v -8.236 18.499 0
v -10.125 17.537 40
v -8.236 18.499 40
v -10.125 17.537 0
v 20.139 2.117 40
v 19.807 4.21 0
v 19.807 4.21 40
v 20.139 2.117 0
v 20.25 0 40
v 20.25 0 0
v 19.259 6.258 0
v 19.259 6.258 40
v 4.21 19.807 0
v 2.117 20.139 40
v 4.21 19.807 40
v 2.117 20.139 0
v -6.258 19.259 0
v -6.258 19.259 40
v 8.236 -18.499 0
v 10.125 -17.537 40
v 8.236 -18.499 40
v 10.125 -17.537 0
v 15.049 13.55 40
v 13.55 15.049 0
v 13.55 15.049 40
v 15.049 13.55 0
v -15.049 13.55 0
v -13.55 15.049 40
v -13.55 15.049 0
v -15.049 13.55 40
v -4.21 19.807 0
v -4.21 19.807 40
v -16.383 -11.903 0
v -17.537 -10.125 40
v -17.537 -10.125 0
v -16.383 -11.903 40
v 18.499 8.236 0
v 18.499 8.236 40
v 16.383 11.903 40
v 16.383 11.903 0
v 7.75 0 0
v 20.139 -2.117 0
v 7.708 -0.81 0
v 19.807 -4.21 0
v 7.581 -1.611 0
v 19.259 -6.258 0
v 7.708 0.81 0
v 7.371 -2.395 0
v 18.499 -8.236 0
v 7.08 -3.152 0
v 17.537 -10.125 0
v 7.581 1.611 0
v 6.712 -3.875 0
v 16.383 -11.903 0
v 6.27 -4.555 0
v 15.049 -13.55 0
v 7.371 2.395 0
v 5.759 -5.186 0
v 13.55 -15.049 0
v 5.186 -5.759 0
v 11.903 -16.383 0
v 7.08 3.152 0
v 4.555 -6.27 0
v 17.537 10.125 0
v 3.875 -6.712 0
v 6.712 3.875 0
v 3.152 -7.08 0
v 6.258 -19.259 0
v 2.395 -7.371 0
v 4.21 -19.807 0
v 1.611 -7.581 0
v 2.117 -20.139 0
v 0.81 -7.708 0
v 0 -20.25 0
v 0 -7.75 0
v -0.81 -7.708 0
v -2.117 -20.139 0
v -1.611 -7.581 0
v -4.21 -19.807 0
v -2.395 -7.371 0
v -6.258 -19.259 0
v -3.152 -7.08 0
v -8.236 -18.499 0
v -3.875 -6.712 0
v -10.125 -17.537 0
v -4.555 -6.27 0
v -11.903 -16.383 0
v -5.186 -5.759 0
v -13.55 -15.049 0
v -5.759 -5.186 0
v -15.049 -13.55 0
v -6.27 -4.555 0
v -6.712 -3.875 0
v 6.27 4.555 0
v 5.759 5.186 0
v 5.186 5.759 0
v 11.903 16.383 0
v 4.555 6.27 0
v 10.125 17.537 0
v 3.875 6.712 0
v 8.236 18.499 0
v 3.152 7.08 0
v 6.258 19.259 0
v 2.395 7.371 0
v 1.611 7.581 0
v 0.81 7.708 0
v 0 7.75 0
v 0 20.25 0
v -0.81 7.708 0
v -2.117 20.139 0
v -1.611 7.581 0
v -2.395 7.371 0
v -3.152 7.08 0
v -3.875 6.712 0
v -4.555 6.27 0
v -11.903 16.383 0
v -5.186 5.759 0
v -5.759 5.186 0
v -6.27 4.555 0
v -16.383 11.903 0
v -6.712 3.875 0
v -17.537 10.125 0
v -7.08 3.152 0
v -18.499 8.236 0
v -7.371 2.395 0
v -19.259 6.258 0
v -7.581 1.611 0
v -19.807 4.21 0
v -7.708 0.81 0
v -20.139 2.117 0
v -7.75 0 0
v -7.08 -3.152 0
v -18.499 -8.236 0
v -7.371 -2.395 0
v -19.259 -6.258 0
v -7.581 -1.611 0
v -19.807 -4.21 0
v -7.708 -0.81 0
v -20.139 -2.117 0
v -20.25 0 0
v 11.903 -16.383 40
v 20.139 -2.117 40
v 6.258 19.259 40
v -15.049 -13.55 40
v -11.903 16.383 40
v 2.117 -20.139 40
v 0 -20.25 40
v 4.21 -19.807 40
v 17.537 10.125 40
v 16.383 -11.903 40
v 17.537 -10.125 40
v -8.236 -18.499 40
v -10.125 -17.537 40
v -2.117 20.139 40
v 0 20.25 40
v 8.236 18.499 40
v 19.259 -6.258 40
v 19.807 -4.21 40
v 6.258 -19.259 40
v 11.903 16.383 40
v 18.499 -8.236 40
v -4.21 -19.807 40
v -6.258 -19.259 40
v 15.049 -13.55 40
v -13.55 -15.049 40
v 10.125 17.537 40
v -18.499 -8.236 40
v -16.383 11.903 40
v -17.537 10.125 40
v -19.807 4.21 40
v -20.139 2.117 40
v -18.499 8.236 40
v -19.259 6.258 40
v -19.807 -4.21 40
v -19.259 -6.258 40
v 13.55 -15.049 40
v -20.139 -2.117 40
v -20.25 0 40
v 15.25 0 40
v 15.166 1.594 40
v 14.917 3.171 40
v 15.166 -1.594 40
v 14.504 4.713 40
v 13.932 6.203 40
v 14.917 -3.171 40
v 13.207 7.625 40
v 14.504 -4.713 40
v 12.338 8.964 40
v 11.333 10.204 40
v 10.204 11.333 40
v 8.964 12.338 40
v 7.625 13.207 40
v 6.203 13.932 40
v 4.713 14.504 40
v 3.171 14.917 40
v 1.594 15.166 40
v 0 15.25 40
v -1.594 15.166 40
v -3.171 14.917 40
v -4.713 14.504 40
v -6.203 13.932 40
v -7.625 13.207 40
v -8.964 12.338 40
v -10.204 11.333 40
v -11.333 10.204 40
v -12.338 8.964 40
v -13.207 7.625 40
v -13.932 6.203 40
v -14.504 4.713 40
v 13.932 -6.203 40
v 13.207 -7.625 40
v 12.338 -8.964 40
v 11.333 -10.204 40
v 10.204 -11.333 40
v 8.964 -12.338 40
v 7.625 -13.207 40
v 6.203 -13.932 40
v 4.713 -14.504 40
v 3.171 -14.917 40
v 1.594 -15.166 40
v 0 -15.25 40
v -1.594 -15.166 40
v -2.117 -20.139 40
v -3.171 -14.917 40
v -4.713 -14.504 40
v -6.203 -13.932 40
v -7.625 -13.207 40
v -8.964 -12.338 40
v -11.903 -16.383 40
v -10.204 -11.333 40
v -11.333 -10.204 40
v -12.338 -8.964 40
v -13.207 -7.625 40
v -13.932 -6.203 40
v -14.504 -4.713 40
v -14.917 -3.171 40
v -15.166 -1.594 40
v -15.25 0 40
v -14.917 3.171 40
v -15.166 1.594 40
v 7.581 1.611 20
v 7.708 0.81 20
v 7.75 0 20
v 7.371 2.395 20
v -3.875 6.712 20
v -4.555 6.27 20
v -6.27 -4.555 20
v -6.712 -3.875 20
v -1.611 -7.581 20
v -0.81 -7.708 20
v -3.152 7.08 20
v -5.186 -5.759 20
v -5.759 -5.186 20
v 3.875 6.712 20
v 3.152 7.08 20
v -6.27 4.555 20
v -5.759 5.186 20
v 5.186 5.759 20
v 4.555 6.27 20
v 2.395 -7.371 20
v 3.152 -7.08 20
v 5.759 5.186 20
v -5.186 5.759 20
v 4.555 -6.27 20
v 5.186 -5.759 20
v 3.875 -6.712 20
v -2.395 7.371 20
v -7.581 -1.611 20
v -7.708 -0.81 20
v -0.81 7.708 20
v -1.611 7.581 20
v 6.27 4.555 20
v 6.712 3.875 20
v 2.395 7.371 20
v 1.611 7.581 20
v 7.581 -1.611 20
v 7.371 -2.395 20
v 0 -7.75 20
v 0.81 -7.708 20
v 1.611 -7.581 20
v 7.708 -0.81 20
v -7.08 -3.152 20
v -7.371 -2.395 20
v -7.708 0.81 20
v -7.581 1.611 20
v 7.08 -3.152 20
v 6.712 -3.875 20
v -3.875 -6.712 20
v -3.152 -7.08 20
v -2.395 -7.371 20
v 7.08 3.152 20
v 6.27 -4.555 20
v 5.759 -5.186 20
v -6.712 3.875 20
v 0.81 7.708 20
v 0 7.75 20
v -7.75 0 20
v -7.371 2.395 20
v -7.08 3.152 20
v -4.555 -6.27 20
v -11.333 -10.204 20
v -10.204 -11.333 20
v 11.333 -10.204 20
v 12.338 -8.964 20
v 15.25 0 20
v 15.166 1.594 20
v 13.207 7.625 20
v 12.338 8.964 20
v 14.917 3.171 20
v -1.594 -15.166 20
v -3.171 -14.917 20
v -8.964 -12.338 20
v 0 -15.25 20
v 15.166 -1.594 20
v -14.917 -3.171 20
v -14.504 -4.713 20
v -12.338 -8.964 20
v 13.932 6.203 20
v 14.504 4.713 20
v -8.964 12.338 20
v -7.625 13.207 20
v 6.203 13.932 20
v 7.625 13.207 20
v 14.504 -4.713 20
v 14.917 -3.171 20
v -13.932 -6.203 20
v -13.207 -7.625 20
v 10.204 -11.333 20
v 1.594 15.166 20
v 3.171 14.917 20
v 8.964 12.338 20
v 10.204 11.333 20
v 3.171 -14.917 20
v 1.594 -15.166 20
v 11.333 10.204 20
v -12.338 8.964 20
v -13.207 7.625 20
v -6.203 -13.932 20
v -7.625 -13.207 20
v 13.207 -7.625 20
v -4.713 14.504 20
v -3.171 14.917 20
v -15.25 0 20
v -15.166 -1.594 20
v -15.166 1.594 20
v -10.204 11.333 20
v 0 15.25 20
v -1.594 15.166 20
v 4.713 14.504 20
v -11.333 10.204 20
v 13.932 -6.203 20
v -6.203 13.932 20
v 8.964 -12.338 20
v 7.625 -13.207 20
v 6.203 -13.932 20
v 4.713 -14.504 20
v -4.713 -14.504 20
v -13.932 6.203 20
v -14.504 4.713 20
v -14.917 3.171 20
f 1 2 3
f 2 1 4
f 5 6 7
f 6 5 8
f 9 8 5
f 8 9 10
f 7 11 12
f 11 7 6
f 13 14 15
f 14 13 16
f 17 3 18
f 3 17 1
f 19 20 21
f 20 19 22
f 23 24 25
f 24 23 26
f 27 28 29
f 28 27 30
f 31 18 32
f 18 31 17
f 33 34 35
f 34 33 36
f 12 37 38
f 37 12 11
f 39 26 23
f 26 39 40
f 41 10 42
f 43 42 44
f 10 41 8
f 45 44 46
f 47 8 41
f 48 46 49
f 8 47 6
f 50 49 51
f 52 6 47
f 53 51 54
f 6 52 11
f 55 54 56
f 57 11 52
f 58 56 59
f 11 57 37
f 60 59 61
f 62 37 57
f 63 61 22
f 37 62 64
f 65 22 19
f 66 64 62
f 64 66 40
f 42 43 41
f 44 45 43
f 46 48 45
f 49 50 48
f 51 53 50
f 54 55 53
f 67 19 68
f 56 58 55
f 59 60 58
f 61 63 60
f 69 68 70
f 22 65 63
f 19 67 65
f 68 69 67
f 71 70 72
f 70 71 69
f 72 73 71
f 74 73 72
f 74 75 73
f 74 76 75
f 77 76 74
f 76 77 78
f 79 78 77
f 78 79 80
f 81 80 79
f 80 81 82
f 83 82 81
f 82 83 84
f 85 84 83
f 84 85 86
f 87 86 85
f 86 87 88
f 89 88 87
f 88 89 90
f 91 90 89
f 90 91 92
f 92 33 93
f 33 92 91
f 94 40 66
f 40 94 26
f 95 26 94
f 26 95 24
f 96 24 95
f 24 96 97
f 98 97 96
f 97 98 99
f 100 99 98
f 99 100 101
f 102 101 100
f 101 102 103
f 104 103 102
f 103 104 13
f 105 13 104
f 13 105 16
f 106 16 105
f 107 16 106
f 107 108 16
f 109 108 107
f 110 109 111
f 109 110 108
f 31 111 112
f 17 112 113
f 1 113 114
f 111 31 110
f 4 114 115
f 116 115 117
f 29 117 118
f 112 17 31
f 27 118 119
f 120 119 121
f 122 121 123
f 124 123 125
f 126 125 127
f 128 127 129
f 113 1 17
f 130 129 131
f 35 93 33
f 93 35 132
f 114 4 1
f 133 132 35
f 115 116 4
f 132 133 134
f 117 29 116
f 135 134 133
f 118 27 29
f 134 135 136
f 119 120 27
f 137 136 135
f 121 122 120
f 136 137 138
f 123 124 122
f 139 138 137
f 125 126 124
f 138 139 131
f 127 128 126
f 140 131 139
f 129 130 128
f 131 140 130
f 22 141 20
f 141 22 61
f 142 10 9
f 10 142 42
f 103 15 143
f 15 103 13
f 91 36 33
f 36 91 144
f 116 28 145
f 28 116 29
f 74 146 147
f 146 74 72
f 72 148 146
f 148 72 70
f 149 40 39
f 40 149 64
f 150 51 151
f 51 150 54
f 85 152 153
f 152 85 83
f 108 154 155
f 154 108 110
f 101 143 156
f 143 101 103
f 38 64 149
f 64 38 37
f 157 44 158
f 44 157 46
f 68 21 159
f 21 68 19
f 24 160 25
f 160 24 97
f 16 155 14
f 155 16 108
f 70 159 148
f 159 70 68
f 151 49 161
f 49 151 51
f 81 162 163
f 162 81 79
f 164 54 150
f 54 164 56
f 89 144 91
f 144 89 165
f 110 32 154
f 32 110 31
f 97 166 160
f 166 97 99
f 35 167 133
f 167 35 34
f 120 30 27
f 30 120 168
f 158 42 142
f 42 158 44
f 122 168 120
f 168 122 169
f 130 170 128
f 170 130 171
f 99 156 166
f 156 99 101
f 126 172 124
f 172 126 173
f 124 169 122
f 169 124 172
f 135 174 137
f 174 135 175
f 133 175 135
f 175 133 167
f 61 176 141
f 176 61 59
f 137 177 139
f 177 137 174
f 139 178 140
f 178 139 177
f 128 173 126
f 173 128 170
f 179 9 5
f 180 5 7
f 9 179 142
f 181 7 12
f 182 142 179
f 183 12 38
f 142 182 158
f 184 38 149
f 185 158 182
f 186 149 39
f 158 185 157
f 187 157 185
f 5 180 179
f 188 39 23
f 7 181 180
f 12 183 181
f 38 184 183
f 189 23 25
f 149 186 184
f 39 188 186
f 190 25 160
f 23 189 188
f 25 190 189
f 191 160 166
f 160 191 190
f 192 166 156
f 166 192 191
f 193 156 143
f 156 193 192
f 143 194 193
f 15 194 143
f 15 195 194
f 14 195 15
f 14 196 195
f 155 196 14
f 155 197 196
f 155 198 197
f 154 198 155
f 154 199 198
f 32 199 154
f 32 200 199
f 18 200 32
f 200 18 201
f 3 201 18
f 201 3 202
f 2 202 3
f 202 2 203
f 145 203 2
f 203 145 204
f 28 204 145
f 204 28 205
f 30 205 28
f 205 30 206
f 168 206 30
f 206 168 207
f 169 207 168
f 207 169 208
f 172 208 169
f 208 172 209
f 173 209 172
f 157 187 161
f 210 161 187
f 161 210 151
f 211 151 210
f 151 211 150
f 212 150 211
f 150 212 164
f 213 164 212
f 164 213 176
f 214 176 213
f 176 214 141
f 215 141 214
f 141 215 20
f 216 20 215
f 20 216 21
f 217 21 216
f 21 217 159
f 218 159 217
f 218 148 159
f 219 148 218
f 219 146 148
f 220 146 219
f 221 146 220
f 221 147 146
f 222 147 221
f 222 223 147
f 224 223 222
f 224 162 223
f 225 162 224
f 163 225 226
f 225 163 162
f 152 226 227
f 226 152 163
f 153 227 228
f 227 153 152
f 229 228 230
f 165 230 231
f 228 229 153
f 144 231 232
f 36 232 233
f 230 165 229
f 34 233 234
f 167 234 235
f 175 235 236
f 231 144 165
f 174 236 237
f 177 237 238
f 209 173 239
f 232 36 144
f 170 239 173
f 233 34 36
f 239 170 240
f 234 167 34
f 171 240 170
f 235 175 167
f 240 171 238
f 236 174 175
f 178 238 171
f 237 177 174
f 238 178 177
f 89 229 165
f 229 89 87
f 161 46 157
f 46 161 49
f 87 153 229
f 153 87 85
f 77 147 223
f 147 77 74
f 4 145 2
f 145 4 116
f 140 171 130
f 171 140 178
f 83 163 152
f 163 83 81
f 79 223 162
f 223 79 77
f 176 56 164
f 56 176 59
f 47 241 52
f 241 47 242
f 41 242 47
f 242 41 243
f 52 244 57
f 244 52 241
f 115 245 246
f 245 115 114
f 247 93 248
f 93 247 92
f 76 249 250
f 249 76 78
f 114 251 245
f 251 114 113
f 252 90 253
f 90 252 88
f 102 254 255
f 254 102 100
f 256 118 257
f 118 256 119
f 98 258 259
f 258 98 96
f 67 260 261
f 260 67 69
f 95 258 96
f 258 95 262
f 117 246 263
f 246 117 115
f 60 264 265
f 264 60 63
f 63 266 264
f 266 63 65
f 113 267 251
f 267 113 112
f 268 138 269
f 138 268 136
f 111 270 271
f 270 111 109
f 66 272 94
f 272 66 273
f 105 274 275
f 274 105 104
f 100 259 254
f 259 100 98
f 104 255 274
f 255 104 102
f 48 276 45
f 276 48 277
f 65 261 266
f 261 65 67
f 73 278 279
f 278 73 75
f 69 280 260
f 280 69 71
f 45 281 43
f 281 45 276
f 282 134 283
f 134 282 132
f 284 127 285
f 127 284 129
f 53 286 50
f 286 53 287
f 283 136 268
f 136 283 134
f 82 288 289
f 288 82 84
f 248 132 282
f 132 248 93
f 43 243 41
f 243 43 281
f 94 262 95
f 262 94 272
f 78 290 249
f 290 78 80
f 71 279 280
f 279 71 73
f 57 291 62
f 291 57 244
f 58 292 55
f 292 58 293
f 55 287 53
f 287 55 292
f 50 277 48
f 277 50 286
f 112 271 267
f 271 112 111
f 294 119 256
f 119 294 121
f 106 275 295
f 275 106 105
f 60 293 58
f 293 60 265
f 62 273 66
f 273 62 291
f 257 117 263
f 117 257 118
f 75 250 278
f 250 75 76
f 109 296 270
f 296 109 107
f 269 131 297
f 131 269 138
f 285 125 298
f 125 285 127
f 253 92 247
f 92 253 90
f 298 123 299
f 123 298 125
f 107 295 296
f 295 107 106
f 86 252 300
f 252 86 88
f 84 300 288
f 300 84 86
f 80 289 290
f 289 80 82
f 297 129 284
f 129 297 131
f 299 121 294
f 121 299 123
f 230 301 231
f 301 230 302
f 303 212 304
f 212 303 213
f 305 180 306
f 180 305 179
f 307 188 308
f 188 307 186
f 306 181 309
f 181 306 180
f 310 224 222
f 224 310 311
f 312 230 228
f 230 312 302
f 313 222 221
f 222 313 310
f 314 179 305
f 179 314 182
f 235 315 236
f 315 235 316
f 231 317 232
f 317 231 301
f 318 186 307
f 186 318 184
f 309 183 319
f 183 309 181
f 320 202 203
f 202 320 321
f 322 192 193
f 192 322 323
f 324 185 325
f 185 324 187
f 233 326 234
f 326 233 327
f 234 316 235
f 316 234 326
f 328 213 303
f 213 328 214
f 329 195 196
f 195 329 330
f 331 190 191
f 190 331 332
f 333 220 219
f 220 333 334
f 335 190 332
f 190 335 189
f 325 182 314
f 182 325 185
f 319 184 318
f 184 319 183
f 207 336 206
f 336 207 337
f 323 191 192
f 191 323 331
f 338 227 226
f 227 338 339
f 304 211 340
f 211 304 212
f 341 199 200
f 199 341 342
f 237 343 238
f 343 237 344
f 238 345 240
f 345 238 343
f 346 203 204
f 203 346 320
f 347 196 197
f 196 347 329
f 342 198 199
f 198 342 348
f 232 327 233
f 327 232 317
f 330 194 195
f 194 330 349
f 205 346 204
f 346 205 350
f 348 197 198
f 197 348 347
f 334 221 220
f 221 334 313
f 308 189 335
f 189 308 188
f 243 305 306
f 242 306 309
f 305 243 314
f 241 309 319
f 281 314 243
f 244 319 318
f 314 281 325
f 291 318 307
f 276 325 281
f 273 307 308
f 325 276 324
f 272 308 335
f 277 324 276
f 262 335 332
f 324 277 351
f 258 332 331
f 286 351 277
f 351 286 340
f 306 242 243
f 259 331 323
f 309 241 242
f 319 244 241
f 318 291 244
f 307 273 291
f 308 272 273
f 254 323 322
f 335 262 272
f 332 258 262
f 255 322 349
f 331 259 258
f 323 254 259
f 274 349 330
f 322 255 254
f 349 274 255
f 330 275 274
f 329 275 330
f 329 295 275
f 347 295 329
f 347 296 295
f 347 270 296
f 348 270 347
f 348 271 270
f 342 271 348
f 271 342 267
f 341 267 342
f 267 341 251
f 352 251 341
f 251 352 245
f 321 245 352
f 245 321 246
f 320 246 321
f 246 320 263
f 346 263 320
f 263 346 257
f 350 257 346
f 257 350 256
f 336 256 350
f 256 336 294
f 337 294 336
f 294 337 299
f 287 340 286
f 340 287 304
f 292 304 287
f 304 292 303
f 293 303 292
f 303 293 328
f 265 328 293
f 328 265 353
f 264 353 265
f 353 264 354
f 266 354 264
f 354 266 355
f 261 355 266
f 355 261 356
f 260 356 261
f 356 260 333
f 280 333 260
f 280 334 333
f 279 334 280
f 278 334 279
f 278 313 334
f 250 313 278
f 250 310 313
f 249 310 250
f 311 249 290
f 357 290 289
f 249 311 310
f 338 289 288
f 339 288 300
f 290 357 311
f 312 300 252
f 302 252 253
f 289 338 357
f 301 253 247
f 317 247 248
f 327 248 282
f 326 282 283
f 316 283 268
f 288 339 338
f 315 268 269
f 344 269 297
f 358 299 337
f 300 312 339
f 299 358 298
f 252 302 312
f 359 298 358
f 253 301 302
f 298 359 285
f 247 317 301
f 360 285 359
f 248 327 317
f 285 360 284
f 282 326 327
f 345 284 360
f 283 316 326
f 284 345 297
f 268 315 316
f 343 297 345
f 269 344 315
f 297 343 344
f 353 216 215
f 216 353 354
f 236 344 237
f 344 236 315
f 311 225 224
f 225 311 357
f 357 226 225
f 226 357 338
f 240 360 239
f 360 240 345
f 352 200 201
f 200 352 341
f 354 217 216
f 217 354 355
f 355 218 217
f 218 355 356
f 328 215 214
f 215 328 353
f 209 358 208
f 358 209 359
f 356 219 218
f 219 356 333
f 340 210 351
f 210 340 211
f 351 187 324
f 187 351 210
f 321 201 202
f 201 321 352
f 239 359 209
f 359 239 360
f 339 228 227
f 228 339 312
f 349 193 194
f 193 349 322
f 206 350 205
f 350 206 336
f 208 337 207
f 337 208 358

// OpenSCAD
cameraLensDiameter = 15;
eyepieceDiameter = 30;
wallThickness = 5;
cameraLensCuffHeight = 20;
eyepieceCuffHeight = 20;
clearance = 0.25;

$fn = 60;
overcut = 0.01;
adapterDiameter = max(cameraLensDiameter, eyepieceDiameter) + 
    2*wallThickness + 2*clearance;
adapterHeight = cameraLensCuffHeight + eyepieceCuffHeight;

difference() {
    cylinder(h=adapterHeight, d=adapterDiameter);
    translate([0,0,-overcut])
        cylinder(h=cameraLensCuffHeight + 2*overcut, 
            d=cameraLensDiameter + 2*clearance);
    translate([0,0,cameraLensCuffHeight])
        cylinder(h=eyepieceCuffHeight + overcut, 
            d=eyepieceDiameter + 2*clearance);}
